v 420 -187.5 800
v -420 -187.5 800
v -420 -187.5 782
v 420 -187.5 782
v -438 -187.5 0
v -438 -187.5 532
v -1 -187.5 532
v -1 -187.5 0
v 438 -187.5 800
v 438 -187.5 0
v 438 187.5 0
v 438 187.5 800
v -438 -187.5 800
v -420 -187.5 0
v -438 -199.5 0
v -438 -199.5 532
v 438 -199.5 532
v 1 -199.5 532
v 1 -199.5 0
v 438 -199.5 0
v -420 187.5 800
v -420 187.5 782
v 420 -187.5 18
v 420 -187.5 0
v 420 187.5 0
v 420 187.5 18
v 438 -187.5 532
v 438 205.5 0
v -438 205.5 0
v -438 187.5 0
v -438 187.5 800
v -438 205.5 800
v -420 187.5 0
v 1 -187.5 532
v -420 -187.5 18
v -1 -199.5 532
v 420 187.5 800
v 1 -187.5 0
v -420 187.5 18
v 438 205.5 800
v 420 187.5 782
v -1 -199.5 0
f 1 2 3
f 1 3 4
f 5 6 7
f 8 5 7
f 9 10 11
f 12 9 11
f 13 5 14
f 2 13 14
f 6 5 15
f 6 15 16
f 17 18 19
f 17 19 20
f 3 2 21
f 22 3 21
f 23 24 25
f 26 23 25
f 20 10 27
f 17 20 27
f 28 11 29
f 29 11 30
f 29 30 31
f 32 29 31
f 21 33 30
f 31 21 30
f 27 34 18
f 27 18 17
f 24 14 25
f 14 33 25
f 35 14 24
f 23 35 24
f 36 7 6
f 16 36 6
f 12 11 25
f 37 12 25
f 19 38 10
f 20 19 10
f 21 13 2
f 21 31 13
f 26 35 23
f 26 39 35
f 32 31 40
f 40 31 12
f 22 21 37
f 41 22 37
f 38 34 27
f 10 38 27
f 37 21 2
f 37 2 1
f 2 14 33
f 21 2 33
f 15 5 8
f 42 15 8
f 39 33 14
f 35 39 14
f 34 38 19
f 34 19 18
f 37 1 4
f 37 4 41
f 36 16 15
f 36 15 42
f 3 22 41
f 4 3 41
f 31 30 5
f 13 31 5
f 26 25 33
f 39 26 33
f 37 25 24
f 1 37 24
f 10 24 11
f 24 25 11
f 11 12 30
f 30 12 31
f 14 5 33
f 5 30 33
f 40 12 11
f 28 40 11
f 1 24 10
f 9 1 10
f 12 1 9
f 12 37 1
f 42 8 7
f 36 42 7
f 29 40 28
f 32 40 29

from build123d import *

# Parameters (mm, degrees)
F1_DEPTH  = 800
F2_W      = 840
F2_H      = 375
F3_DEPTH  = 18
F5_DEPTH  = 18
F6_W      = 840
F6_H      = 18
F7_DEPTH  = 18
F8_W      = 419
F8_H      = 532
F8_W_2    = 18
F9_DEPTH  = 12
F8_W_3    = 437
F10_W     = 375
F10_H     = 800
F11_DEPTH = 12


with BuildPart() as f1:
    # F0 (on Top) → F1 (new body)
    with BuildSketch(Plane.XY):
        Polygon((-438, -187.5), (-420, -187.5), (-420, -169.5), (-420, 169.5), (-420, 187.5), (-438, 187.5), align=None)
    extrude(amount=F1_DEPTH)


with BuildPart() as f1b:
    # F0 (on Top) → F1, piece 2 (new body)
    with BuildSketch(Plane.XY):
        Polygon((420, -187.5), (438, -187.5), (438, 187.5), (420, 187.5), (420, 169.5), (420, -169.5), align=None)
    extrude(amount=F1_DEPTH)


with BuildPart() as f3:
    # F2 (on face) → F3 (new body)
    with BuildSketch(Plane.XY.offset(800)):
        Rectangle(F2_W, F2_H)
    extrude(amount=-F3_DEPTH)


with BuildPart() as f5:
    # F4 (on face) → F5 (new body)
    with BuildSketch(Plane.XY):
        Polygon((-420, -169.5), (-420, -187.5), (420, -187.5), (420, 187.5), (-420, 187.5), (-420, 169.5), align=None)
    extrude(amount=F5_DEPTH)


with BuildPart() as f7:
    # F6 (on face) → F7 (new body)
    with BuildSketch(Plane(origin=(0, 187.5, 0), x_dir=(-1, 0, 0), z_dir=(0, 1, 0))):
        Polygon((-420, 800), (-438, 800), (-438, 0), (438, 0), (438, 800), (420, 800), (420, 782), (-420, 782), align=None)
        with Locations((0, 791)):
            Rectangle(F6_W, F6_H)
    extrude(amount=F7_DEPTH)


with BuildPart() as f9:
    # F8 (on face) → F9 (new body)
    with BuildSketch(Plane.XZ.offset(187.5)):
        with Locations((-210.5, 266)):
            Rectangle(F8_W, F8_H)
        with Locations((-429, 266)):
            Rectangle(F8_W_2, F8_H)
    extrude(amount=F9_DEPTH)


with BuildPart() as f9b:
    # F8 (on face) → F9, piece 2 (new body)
    with BuildSketch(Plane.XZ.offset(187.5)):
        with Locations((219.5, 266)):
            Rectangle(F8_W_3, F8_H)
    extrude(amount=F9_DEPTH)


with BuildPart() as f11:
    # F10 (on face) → F11 (new body)
    with BuildSketch(Plane.YZ.offset(438)):
        with Locations((0, 400)):
            Rectangle(F10_W, F10_H)
    extrude(amount=F11_DEPTH)


solid = Compound([f1.part, f1b.part, f3.part, f5.part, f7.part, f9.part, f9b.part])
